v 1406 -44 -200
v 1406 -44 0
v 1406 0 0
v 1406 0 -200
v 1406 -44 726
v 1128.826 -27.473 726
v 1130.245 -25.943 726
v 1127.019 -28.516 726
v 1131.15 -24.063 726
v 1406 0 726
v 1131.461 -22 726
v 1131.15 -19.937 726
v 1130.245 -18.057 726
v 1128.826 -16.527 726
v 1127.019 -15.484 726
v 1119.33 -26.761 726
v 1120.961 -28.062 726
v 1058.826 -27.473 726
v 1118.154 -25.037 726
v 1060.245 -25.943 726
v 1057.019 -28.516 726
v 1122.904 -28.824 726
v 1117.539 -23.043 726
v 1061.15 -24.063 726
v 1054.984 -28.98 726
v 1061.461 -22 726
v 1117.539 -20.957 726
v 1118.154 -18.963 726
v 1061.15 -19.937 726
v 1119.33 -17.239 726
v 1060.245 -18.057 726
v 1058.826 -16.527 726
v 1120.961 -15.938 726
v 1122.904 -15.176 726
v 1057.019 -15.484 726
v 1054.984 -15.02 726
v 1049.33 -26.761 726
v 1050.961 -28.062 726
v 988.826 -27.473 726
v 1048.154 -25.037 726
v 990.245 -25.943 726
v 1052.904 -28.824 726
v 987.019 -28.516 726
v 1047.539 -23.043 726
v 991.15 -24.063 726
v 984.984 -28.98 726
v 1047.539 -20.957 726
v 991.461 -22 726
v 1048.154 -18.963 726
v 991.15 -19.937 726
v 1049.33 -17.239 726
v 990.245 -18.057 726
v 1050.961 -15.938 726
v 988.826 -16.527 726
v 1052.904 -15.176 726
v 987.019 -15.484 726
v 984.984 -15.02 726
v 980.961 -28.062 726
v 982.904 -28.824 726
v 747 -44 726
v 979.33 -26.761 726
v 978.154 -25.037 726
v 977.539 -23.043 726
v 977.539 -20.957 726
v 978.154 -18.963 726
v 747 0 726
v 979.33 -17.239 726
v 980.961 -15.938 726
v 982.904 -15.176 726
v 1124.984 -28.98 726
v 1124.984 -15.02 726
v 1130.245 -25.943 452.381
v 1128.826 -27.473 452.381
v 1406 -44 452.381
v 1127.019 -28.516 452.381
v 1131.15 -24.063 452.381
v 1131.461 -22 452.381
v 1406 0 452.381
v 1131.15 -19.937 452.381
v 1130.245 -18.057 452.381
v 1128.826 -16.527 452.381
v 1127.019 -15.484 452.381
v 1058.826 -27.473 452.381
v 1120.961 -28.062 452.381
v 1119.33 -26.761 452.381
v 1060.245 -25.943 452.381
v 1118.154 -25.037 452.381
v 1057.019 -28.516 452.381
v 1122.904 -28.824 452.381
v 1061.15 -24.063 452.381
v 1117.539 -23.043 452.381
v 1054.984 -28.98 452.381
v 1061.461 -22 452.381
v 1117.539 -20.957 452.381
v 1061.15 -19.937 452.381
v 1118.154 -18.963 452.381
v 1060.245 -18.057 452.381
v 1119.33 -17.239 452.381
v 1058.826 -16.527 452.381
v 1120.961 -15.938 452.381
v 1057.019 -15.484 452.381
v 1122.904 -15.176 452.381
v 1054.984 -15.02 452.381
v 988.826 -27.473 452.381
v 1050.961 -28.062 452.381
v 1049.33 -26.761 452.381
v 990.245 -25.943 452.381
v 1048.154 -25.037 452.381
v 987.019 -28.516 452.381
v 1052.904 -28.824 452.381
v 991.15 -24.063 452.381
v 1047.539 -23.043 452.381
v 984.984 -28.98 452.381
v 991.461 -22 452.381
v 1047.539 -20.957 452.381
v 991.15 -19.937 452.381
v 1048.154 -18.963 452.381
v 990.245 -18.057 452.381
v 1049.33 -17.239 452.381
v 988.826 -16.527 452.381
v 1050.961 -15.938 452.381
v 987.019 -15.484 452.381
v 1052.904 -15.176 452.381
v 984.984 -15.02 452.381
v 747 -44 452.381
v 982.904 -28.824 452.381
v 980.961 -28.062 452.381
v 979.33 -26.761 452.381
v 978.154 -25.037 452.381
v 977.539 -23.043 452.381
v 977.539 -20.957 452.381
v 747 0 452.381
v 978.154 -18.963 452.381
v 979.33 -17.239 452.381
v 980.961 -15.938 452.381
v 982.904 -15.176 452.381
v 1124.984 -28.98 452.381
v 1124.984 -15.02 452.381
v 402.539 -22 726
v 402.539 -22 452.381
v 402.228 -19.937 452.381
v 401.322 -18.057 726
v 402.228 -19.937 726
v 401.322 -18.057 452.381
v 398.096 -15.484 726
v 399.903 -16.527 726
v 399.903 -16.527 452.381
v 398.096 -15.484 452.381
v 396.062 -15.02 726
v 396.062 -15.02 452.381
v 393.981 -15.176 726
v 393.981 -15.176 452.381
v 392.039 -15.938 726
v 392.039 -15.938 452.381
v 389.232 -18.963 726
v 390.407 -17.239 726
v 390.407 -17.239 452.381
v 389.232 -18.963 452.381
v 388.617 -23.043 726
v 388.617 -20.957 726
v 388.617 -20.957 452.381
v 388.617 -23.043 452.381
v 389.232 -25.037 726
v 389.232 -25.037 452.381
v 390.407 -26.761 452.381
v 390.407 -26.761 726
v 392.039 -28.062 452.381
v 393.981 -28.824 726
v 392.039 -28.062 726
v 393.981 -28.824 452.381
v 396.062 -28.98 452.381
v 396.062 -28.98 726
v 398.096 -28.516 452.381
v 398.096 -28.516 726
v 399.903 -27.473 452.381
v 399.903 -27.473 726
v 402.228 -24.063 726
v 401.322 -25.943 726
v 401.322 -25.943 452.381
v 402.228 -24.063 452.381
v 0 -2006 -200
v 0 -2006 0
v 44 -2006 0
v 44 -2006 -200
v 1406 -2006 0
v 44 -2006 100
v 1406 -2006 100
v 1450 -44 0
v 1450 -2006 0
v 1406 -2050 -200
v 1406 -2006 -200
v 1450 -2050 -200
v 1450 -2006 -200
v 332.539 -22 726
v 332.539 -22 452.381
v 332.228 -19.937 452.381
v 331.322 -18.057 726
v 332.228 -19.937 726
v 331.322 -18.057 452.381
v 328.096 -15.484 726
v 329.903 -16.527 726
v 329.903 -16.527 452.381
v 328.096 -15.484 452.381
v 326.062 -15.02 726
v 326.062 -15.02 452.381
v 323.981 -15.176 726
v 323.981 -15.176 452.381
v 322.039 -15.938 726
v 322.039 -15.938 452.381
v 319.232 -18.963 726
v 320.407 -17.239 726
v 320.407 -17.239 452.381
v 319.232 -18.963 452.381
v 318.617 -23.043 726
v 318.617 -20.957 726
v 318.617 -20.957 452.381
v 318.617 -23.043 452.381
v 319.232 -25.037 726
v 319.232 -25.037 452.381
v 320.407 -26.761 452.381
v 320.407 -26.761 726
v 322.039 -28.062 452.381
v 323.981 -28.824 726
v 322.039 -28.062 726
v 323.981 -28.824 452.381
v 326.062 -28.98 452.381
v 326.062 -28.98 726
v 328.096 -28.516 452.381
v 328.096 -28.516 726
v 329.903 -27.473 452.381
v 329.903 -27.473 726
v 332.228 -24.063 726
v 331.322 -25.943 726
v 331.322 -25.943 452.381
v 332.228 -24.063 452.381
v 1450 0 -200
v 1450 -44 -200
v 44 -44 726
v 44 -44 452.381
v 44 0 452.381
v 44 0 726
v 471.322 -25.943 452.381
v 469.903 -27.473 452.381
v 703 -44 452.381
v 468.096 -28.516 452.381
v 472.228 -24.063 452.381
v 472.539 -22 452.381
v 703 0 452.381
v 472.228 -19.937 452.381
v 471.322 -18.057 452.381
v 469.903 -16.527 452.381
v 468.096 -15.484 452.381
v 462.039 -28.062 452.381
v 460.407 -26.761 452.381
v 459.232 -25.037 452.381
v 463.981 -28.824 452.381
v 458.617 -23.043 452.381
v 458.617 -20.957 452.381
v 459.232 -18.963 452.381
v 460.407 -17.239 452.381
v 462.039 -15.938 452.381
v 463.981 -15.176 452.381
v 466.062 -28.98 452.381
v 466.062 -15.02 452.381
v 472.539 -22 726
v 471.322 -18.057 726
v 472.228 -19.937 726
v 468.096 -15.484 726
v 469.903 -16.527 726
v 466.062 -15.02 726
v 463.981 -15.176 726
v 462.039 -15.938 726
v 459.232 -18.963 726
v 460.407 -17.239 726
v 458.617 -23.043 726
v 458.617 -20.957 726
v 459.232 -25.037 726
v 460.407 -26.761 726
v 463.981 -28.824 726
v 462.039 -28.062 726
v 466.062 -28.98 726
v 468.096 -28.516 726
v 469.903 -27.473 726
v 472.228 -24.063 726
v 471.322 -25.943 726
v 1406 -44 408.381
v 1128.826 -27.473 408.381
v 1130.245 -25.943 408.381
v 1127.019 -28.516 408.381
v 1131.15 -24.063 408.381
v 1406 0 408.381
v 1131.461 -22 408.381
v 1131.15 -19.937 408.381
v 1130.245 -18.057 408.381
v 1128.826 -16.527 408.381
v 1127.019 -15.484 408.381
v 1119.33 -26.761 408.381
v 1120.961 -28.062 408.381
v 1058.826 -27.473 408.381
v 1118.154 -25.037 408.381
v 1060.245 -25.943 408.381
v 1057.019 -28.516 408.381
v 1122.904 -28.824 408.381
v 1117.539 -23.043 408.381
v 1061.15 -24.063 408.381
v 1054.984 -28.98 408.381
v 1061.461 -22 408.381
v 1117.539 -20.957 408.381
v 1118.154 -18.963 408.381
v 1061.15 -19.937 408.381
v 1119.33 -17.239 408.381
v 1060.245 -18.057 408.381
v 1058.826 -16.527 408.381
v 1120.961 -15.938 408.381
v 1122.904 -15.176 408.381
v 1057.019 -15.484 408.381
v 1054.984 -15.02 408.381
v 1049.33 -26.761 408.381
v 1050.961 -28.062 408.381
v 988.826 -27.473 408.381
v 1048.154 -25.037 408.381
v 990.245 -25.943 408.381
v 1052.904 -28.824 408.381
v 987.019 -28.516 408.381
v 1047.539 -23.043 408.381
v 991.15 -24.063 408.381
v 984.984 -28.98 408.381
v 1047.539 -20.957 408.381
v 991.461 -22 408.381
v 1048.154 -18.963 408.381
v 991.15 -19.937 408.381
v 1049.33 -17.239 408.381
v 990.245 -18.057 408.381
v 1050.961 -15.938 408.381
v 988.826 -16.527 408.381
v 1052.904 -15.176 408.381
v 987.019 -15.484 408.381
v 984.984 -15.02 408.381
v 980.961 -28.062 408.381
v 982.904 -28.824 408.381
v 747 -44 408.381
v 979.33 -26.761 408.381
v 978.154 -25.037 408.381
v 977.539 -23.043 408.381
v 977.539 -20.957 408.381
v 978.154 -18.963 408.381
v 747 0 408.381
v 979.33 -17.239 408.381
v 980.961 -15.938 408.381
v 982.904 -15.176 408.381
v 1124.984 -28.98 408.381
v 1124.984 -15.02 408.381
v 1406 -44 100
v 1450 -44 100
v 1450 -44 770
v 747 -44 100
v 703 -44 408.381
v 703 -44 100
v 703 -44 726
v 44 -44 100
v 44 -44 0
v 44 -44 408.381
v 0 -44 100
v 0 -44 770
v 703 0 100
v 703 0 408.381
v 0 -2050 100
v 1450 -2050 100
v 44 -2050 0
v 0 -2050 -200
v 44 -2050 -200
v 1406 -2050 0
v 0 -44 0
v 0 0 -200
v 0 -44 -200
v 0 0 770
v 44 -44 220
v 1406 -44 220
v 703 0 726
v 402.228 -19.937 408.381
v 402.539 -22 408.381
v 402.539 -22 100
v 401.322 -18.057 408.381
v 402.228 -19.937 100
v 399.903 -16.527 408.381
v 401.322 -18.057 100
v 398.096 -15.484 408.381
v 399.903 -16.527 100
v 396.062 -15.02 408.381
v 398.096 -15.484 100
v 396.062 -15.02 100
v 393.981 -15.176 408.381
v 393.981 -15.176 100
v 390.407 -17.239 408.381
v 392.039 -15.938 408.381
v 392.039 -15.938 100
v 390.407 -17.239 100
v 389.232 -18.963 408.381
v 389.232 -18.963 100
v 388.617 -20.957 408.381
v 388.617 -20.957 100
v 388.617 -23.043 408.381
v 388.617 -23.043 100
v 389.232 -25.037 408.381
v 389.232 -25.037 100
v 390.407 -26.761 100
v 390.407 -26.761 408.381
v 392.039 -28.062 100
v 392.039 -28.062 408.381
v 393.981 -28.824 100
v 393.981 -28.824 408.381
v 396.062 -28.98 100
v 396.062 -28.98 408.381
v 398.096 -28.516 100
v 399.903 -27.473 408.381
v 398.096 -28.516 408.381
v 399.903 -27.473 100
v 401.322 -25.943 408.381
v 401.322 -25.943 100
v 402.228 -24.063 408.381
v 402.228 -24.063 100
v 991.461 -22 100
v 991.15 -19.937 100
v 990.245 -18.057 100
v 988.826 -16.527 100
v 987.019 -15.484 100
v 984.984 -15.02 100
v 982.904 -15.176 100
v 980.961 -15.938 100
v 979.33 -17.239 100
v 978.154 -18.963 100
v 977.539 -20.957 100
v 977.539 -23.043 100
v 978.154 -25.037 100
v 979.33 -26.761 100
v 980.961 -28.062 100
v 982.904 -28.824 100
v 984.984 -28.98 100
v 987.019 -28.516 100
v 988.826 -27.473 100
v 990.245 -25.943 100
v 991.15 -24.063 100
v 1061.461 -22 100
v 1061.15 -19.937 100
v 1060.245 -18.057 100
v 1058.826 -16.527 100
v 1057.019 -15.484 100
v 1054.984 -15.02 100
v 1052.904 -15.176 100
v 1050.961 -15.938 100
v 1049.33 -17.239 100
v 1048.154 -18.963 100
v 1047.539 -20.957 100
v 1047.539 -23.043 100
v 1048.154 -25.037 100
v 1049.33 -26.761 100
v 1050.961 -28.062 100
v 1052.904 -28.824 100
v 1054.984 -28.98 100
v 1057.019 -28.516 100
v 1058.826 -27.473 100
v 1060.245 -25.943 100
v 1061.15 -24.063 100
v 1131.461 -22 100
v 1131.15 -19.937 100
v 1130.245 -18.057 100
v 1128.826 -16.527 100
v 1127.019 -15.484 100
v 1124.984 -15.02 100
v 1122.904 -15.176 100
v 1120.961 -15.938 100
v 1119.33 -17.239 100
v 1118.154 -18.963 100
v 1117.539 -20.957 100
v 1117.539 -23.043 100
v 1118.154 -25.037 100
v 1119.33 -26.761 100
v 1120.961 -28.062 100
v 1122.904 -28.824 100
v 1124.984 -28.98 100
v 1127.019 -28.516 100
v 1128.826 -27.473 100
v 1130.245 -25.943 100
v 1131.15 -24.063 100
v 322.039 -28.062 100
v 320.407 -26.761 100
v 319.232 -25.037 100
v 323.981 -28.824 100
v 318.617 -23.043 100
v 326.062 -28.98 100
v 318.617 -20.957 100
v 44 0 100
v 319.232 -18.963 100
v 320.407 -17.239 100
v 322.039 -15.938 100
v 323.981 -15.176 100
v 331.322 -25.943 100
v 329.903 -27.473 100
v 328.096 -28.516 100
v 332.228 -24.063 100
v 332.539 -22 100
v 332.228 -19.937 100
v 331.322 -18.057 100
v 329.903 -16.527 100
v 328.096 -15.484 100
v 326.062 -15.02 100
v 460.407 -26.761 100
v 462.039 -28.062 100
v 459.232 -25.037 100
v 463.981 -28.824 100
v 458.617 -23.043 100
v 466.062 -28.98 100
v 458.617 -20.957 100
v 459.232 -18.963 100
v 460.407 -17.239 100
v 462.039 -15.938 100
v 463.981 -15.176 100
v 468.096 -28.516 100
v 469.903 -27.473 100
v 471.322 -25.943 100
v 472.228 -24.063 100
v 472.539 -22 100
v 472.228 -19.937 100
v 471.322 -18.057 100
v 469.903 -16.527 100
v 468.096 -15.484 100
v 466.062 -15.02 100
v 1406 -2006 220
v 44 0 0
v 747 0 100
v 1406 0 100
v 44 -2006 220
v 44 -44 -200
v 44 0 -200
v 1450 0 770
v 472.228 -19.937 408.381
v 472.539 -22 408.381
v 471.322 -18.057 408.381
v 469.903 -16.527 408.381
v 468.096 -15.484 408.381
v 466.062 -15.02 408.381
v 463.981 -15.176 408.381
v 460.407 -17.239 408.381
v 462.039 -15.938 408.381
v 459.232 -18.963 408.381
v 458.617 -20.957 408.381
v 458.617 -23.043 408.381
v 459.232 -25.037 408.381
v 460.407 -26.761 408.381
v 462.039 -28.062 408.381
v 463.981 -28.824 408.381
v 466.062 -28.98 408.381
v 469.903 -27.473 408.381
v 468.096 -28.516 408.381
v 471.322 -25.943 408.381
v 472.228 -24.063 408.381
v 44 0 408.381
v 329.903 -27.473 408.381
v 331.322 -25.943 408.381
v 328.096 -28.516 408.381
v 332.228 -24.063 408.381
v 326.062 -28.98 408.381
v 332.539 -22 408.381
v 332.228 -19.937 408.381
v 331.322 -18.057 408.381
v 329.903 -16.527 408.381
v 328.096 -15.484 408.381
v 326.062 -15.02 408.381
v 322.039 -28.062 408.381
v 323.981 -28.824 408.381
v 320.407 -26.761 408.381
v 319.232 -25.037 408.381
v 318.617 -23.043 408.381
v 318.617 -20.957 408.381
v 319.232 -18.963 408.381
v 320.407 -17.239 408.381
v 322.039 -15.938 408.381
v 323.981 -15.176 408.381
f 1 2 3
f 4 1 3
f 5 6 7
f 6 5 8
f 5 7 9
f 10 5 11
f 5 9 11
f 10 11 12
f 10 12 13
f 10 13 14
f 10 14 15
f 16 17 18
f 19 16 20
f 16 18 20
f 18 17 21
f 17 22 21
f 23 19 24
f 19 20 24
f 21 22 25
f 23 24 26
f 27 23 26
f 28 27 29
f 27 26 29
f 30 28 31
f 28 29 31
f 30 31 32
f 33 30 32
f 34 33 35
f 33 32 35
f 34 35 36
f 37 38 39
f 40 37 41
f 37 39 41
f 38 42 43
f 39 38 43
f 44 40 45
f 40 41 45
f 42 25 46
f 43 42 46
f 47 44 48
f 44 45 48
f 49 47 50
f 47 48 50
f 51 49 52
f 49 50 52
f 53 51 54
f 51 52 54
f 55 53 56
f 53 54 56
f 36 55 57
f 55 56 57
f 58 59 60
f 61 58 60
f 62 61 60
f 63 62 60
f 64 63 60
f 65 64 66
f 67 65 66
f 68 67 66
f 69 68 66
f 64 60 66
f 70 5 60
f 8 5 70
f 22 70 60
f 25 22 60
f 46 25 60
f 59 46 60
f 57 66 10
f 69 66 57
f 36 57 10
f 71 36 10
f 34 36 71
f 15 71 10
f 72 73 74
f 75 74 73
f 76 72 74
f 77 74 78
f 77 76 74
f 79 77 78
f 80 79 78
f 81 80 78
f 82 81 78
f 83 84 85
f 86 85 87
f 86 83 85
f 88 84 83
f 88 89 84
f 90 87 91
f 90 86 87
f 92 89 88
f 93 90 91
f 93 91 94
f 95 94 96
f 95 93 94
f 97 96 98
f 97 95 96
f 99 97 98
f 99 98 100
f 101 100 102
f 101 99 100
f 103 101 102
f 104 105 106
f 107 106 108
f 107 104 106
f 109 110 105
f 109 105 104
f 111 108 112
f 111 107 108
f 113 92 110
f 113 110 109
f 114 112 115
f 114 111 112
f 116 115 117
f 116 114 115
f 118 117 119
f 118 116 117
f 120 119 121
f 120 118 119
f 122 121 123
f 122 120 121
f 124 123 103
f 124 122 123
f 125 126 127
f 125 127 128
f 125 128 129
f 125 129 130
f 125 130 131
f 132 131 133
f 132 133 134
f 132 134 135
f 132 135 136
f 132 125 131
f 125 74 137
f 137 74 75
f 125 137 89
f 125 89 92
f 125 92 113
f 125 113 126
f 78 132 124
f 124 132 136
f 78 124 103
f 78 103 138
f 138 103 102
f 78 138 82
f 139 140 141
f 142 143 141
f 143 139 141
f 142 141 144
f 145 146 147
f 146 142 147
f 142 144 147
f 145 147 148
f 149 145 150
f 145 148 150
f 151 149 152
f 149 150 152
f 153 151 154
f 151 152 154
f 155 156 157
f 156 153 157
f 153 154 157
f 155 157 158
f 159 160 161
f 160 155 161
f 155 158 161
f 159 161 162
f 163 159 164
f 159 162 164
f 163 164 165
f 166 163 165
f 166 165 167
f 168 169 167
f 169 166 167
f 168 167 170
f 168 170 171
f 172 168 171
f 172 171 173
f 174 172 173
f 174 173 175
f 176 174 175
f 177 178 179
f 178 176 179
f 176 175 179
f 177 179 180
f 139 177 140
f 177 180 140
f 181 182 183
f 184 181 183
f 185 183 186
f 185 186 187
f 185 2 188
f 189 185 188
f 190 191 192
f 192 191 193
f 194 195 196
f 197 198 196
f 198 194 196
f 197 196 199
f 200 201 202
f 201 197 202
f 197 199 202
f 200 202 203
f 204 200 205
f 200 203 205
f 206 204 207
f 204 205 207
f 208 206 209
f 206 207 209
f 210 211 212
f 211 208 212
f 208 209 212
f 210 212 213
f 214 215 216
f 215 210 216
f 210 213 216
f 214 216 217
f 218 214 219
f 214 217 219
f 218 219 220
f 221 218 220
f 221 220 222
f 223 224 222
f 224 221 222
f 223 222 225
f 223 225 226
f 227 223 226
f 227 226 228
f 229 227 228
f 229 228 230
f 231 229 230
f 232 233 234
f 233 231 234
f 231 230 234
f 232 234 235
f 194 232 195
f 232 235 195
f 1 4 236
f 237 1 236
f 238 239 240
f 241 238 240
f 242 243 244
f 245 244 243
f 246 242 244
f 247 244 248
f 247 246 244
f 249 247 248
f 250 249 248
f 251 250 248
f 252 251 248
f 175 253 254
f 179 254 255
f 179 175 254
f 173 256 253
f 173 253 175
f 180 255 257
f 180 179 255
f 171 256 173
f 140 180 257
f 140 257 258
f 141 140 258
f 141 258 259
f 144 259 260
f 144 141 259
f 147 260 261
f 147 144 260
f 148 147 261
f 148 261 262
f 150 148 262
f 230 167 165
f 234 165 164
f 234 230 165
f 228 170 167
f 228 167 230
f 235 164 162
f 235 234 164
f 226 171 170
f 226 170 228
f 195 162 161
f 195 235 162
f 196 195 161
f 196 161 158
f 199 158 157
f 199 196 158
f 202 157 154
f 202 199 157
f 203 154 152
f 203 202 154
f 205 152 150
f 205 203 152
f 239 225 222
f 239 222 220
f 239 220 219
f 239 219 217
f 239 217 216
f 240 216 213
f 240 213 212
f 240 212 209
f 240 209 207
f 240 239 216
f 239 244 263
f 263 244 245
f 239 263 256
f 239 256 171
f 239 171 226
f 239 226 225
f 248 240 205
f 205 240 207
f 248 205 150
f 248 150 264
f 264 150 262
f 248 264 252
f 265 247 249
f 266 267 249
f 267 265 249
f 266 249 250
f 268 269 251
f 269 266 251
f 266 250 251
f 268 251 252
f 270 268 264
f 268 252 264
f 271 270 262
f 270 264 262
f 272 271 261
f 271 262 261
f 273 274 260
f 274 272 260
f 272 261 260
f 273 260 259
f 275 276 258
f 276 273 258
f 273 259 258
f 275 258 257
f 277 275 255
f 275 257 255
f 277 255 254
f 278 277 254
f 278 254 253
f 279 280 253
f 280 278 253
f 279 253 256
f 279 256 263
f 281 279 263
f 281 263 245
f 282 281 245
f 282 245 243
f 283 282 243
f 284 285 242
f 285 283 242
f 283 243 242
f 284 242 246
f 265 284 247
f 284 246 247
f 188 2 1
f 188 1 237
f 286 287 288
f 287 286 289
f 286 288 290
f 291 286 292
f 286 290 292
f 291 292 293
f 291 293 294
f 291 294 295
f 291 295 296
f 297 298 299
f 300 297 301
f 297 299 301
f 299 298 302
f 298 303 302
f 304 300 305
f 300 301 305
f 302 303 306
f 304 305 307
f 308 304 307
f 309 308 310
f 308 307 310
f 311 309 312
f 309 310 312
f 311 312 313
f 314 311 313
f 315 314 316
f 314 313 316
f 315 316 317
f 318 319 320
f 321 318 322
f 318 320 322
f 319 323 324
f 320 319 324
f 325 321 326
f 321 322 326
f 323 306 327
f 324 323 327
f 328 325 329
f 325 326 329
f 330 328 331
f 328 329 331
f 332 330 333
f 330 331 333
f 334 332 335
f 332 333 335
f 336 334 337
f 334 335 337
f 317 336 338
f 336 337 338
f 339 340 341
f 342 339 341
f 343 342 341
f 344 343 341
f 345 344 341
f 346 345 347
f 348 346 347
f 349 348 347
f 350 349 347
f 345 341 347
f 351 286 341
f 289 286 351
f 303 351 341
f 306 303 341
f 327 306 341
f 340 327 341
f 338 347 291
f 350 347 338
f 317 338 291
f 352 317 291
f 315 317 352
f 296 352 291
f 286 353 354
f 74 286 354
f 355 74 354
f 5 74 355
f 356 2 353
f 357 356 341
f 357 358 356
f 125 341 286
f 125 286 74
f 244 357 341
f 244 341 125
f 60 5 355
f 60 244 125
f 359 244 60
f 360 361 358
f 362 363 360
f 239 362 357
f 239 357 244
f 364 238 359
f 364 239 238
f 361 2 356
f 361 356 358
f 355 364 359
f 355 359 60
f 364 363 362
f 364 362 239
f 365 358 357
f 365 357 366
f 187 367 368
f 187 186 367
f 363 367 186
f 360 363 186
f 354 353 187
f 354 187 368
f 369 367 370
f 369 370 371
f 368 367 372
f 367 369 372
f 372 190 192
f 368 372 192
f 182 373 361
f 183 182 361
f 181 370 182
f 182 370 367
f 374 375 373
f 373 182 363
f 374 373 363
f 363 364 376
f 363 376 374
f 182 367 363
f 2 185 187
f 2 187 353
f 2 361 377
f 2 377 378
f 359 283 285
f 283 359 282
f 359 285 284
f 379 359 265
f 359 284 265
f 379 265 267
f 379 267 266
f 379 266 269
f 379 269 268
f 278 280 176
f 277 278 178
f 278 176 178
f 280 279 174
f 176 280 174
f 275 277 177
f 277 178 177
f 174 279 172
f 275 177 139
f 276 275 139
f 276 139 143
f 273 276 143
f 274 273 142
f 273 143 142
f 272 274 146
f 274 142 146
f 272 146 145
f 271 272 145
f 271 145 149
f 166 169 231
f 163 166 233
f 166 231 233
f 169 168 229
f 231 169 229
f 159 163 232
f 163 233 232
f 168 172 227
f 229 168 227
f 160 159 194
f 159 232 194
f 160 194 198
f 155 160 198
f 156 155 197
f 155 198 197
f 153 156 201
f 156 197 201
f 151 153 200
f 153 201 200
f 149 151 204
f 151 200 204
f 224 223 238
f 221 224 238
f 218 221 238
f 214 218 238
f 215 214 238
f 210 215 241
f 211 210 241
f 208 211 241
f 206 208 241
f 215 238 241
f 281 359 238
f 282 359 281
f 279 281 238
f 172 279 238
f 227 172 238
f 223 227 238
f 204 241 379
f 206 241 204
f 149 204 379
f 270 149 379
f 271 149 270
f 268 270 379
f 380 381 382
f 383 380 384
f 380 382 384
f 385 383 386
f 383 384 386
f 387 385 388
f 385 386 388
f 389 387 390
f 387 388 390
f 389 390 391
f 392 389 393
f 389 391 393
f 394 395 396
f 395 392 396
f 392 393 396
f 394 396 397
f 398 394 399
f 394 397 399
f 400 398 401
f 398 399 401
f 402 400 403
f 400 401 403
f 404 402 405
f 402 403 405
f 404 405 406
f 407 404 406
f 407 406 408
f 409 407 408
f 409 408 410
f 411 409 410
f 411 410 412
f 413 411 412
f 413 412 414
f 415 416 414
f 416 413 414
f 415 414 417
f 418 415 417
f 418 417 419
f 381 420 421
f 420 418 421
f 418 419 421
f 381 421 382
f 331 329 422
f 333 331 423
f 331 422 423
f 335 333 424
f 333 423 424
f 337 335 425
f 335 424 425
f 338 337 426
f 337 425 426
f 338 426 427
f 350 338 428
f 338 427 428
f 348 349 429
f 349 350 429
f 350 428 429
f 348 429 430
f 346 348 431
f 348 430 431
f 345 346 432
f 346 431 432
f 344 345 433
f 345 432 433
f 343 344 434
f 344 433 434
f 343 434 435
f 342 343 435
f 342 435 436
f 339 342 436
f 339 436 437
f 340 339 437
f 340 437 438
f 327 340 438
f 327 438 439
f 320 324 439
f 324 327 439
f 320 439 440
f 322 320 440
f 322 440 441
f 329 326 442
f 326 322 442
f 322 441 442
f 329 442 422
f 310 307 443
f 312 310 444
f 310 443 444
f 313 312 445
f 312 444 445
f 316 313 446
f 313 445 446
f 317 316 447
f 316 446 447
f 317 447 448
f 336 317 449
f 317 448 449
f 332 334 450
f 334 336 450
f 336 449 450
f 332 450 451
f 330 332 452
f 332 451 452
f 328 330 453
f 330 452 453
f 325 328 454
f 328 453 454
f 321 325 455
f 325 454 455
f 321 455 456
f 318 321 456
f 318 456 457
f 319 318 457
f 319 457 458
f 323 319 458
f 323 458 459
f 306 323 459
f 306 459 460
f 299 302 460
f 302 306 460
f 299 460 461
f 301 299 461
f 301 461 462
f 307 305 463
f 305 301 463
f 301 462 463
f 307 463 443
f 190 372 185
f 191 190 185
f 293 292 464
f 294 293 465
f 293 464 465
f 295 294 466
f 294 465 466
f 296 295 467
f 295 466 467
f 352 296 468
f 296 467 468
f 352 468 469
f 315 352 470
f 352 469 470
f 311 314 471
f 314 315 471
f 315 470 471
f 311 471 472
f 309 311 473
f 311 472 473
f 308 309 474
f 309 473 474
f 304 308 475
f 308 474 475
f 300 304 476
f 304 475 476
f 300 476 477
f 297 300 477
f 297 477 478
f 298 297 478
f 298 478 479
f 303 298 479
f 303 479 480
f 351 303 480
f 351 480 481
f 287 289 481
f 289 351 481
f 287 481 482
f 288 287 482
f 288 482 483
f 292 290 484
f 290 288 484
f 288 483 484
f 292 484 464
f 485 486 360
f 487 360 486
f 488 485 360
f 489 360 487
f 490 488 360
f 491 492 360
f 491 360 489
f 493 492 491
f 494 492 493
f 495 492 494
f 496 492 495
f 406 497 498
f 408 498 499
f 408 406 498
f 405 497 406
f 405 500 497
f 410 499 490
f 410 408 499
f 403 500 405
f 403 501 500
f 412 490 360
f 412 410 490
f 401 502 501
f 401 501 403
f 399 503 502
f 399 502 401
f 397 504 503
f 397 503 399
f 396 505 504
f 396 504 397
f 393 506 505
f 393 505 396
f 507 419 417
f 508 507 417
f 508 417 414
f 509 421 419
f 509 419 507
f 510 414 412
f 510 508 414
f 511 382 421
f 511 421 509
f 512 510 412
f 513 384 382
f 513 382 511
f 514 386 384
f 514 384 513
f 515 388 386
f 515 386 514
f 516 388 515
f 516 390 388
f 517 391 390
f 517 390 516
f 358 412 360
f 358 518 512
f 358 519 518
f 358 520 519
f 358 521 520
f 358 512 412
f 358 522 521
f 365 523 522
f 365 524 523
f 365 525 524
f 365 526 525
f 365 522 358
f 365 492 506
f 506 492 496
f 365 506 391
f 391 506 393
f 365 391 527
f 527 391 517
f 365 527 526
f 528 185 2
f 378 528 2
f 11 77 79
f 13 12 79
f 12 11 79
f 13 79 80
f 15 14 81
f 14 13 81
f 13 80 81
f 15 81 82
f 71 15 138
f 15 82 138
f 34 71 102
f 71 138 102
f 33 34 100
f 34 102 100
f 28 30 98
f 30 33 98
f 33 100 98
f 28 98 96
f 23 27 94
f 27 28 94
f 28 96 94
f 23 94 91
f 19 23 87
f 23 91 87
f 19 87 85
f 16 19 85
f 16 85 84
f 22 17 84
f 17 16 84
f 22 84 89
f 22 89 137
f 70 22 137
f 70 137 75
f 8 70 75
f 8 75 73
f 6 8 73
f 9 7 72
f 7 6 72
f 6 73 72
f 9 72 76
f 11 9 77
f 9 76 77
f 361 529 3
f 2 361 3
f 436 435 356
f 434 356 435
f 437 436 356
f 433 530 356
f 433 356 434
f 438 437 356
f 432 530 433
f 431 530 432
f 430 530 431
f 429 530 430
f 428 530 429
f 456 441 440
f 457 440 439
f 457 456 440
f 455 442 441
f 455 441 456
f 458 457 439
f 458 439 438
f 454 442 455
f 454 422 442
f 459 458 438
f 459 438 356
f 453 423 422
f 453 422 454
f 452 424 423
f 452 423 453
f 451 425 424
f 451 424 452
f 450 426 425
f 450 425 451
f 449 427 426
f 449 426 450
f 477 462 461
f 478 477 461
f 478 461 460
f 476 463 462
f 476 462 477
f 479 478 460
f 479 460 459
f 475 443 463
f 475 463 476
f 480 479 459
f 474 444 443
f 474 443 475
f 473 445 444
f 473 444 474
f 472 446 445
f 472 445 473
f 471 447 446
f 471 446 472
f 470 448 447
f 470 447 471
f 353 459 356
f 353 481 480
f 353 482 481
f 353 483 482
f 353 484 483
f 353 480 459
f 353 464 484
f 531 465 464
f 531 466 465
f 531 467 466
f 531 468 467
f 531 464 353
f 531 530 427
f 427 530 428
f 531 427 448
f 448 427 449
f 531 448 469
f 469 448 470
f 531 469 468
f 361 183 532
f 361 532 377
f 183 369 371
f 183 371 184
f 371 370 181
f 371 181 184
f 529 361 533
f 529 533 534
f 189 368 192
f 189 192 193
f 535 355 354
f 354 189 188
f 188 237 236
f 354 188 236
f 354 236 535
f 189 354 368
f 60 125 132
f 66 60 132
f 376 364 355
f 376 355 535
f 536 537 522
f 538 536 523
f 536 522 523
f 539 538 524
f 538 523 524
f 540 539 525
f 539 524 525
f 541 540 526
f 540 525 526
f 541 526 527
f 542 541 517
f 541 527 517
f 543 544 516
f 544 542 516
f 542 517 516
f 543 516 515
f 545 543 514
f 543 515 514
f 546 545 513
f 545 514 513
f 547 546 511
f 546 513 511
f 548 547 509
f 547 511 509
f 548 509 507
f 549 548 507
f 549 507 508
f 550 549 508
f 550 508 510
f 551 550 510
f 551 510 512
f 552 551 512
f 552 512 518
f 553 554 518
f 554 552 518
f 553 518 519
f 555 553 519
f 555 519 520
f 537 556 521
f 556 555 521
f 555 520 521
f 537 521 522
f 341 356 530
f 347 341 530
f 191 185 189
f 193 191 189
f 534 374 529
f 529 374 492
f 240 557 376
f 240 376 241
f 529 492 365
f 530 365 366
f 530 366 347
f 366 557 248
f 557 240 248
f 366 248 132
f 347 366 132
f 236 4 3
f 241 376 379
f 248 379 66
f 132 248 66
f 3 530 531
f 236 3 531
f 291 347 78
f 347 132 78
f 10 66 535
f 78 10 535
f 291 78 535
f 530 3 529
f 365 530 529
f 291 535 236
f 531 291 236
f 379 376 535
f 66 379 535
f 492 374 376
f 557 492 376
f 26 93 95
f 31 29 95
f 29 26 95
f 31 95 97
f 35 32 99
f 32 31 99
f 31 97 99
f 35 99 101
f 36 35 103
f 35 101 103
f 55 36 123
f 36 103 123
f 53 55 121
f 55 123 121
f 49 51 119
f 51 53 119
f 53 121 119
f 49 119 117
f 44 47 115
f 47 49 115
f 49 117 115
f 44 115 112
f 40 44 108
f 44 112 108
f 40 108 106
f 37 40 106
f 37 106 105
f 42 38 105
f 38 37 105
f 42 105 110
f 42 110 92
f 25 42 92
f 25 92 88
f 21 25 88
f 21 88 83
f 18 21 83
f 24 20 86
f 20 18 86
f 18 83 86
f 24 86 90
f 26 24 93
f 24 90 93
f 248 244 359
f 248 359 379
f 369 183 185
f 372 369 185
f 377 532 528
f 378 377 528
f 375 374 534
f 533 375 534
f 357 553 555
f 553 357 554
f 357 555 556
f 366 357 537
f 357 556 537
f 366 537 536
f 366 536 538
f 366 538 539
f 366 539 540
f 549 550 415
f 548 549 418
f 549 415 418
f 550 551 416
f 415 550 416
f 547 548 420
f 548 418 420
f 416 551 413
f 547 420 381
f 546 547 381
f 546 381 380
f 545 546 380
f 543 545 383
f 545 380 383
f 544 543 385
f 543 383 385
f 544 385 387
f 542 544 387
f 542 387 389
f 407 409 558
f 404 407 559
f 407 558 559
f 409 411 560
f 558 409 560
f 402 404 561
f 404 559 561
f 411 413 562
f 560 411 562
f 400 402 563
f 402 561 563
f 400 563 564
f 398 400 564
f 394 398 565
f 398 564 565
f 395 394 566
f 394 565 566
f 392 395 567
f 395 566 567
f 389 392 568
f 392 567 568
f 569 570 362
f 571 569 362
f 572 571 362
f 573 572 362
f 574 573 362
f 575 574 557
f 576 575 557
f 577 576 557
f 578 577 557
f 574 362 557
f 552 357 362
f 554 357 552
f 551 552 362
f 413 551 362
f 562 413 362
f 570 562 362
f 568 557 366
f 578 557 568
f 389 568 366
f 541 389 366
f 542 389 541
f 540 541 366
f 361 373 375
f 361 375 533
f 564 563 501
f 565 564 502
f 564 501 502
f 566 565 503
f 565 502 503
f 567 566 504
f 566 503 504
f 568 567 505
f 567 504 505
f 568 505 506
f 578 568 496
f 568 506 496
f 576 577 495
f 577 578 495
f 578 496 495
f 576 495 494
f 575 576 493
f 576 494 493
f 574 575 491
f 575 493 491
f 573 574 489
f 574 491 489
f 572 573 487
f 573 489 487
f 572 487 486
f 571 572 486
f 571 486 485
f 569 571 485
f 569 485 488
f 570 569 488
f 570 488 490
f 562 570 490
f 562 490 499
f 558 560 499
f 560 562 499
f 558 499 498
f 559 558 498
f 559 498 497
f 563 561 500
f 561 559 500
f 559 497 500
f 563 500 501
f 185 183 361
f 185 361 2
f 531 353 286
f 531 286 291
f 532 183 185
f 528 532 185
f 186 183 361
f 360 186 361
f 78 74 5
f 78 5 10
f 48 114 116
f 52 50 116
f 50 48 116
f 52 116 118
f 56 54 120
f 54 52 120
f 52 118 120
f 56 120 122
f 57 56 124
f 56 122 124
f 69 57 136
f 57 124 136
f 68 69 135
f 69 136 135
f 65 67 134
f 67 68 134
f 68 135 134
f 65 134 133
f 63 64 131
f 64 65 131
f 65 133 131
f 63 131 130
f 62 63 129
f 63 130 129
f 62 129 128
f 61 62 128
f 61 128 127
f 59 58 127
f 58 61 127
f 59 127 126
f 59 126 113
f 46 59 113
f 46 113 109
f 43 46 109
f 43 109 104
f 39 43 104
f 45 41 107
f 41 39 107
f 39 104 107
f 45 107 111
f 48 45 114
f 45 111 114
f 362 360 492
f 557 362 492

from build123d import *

# Parameters (mm, degrees)
F0_W     = 1450
F0_H     = 2050
F0_W_2   = 1362
F0_H_2   = 1962
F1_DEPTH = 100
F2_W     = 44
F2_H     = 44
F2_R     = 7
F3_DEPTH = 670
F4_W     = 44
F4_H     = 44
F5_DEPTH = 1362
F6_W     = 44
F6_H     = 44
F7_DEPTH = 200
F8_DEPTH = 220


with BuildPart() as f1:
    # F0 (on Top) → F1 (new body)
    with BuildSketch(Plane.XY):
        with Locations((725, -1025)):
            Rectangle(F0_W, F0_H)
        with Locations((725, -1025)):
            Rectangle(F0_W_2, F0_H_2, mode=Mode.SUBTRACT)
    extrude(amount=F1_DEPTH)

    # F2 (on face) → F3 (join)
    with BuildSketch(Plane.XY.offset(100)):
        with Locations((1428, -22)):
            Rectangle(F2_W, F2_H)
        with Locations((22, -22)):
            Rectangle(F2_W, F2_H)
        with Locations((725, -22)):
            Rectangle(F2_W, F2_H)
        with Locations((1054.461237, -22)):
            Circle(F2_R)
        with Locations((984.461237, -22)):
            Circle(F2_R)
        with Locations((1124.461237, -22)):
            Circle(F2_R)
        with Locations((465.538763, -22)):
            Circle(F2_R)
        with Locations((395.538763, -22)):
            Circle(F2_R)
        with Locations((325.538763, -22)):
            Circle(F2_R)
    extrude(amount=F3_DEPTH)

    # F4 (on face) → F5 (join, through all)
    with BuildSketch(Plane.YZ.offset(44)):
        with Locations((-22, 748)):
            Rectangle(F4_W, F4_H)
        with Locations((-22, 430.381075)):
            Rectangle(F4_W, F4_H)
    extrude(amount=F5_DEPTH)

    # F6 (on face) → F7 (join)
    with BuildSketch(Plane.XY):
        with Locations((22, -22)):
            Rectangle(F6_W, F6_H)
        with Locations((1428, -22)):
            Rectangle(F6_W, F6_H)
        with Locations((1428, -2028)):
            Rectangle(F6_W, F6_H)
        with Locations((22, -2028)):
            Rectangle(F6_W, F6_H)
    extrude(amount=-F7_DEPTH)


with BuildPart() as f8:
    # F0 (on Top) → F8 (new body)
    with BuildSketch(Plane.XY):
        with Locations((725, -1025)):
            Rectangle(F0_W_2, F0_H_2)
    extrude(amount=F8_DEPTH)


solid = Compound([f1.part, f8.part])
